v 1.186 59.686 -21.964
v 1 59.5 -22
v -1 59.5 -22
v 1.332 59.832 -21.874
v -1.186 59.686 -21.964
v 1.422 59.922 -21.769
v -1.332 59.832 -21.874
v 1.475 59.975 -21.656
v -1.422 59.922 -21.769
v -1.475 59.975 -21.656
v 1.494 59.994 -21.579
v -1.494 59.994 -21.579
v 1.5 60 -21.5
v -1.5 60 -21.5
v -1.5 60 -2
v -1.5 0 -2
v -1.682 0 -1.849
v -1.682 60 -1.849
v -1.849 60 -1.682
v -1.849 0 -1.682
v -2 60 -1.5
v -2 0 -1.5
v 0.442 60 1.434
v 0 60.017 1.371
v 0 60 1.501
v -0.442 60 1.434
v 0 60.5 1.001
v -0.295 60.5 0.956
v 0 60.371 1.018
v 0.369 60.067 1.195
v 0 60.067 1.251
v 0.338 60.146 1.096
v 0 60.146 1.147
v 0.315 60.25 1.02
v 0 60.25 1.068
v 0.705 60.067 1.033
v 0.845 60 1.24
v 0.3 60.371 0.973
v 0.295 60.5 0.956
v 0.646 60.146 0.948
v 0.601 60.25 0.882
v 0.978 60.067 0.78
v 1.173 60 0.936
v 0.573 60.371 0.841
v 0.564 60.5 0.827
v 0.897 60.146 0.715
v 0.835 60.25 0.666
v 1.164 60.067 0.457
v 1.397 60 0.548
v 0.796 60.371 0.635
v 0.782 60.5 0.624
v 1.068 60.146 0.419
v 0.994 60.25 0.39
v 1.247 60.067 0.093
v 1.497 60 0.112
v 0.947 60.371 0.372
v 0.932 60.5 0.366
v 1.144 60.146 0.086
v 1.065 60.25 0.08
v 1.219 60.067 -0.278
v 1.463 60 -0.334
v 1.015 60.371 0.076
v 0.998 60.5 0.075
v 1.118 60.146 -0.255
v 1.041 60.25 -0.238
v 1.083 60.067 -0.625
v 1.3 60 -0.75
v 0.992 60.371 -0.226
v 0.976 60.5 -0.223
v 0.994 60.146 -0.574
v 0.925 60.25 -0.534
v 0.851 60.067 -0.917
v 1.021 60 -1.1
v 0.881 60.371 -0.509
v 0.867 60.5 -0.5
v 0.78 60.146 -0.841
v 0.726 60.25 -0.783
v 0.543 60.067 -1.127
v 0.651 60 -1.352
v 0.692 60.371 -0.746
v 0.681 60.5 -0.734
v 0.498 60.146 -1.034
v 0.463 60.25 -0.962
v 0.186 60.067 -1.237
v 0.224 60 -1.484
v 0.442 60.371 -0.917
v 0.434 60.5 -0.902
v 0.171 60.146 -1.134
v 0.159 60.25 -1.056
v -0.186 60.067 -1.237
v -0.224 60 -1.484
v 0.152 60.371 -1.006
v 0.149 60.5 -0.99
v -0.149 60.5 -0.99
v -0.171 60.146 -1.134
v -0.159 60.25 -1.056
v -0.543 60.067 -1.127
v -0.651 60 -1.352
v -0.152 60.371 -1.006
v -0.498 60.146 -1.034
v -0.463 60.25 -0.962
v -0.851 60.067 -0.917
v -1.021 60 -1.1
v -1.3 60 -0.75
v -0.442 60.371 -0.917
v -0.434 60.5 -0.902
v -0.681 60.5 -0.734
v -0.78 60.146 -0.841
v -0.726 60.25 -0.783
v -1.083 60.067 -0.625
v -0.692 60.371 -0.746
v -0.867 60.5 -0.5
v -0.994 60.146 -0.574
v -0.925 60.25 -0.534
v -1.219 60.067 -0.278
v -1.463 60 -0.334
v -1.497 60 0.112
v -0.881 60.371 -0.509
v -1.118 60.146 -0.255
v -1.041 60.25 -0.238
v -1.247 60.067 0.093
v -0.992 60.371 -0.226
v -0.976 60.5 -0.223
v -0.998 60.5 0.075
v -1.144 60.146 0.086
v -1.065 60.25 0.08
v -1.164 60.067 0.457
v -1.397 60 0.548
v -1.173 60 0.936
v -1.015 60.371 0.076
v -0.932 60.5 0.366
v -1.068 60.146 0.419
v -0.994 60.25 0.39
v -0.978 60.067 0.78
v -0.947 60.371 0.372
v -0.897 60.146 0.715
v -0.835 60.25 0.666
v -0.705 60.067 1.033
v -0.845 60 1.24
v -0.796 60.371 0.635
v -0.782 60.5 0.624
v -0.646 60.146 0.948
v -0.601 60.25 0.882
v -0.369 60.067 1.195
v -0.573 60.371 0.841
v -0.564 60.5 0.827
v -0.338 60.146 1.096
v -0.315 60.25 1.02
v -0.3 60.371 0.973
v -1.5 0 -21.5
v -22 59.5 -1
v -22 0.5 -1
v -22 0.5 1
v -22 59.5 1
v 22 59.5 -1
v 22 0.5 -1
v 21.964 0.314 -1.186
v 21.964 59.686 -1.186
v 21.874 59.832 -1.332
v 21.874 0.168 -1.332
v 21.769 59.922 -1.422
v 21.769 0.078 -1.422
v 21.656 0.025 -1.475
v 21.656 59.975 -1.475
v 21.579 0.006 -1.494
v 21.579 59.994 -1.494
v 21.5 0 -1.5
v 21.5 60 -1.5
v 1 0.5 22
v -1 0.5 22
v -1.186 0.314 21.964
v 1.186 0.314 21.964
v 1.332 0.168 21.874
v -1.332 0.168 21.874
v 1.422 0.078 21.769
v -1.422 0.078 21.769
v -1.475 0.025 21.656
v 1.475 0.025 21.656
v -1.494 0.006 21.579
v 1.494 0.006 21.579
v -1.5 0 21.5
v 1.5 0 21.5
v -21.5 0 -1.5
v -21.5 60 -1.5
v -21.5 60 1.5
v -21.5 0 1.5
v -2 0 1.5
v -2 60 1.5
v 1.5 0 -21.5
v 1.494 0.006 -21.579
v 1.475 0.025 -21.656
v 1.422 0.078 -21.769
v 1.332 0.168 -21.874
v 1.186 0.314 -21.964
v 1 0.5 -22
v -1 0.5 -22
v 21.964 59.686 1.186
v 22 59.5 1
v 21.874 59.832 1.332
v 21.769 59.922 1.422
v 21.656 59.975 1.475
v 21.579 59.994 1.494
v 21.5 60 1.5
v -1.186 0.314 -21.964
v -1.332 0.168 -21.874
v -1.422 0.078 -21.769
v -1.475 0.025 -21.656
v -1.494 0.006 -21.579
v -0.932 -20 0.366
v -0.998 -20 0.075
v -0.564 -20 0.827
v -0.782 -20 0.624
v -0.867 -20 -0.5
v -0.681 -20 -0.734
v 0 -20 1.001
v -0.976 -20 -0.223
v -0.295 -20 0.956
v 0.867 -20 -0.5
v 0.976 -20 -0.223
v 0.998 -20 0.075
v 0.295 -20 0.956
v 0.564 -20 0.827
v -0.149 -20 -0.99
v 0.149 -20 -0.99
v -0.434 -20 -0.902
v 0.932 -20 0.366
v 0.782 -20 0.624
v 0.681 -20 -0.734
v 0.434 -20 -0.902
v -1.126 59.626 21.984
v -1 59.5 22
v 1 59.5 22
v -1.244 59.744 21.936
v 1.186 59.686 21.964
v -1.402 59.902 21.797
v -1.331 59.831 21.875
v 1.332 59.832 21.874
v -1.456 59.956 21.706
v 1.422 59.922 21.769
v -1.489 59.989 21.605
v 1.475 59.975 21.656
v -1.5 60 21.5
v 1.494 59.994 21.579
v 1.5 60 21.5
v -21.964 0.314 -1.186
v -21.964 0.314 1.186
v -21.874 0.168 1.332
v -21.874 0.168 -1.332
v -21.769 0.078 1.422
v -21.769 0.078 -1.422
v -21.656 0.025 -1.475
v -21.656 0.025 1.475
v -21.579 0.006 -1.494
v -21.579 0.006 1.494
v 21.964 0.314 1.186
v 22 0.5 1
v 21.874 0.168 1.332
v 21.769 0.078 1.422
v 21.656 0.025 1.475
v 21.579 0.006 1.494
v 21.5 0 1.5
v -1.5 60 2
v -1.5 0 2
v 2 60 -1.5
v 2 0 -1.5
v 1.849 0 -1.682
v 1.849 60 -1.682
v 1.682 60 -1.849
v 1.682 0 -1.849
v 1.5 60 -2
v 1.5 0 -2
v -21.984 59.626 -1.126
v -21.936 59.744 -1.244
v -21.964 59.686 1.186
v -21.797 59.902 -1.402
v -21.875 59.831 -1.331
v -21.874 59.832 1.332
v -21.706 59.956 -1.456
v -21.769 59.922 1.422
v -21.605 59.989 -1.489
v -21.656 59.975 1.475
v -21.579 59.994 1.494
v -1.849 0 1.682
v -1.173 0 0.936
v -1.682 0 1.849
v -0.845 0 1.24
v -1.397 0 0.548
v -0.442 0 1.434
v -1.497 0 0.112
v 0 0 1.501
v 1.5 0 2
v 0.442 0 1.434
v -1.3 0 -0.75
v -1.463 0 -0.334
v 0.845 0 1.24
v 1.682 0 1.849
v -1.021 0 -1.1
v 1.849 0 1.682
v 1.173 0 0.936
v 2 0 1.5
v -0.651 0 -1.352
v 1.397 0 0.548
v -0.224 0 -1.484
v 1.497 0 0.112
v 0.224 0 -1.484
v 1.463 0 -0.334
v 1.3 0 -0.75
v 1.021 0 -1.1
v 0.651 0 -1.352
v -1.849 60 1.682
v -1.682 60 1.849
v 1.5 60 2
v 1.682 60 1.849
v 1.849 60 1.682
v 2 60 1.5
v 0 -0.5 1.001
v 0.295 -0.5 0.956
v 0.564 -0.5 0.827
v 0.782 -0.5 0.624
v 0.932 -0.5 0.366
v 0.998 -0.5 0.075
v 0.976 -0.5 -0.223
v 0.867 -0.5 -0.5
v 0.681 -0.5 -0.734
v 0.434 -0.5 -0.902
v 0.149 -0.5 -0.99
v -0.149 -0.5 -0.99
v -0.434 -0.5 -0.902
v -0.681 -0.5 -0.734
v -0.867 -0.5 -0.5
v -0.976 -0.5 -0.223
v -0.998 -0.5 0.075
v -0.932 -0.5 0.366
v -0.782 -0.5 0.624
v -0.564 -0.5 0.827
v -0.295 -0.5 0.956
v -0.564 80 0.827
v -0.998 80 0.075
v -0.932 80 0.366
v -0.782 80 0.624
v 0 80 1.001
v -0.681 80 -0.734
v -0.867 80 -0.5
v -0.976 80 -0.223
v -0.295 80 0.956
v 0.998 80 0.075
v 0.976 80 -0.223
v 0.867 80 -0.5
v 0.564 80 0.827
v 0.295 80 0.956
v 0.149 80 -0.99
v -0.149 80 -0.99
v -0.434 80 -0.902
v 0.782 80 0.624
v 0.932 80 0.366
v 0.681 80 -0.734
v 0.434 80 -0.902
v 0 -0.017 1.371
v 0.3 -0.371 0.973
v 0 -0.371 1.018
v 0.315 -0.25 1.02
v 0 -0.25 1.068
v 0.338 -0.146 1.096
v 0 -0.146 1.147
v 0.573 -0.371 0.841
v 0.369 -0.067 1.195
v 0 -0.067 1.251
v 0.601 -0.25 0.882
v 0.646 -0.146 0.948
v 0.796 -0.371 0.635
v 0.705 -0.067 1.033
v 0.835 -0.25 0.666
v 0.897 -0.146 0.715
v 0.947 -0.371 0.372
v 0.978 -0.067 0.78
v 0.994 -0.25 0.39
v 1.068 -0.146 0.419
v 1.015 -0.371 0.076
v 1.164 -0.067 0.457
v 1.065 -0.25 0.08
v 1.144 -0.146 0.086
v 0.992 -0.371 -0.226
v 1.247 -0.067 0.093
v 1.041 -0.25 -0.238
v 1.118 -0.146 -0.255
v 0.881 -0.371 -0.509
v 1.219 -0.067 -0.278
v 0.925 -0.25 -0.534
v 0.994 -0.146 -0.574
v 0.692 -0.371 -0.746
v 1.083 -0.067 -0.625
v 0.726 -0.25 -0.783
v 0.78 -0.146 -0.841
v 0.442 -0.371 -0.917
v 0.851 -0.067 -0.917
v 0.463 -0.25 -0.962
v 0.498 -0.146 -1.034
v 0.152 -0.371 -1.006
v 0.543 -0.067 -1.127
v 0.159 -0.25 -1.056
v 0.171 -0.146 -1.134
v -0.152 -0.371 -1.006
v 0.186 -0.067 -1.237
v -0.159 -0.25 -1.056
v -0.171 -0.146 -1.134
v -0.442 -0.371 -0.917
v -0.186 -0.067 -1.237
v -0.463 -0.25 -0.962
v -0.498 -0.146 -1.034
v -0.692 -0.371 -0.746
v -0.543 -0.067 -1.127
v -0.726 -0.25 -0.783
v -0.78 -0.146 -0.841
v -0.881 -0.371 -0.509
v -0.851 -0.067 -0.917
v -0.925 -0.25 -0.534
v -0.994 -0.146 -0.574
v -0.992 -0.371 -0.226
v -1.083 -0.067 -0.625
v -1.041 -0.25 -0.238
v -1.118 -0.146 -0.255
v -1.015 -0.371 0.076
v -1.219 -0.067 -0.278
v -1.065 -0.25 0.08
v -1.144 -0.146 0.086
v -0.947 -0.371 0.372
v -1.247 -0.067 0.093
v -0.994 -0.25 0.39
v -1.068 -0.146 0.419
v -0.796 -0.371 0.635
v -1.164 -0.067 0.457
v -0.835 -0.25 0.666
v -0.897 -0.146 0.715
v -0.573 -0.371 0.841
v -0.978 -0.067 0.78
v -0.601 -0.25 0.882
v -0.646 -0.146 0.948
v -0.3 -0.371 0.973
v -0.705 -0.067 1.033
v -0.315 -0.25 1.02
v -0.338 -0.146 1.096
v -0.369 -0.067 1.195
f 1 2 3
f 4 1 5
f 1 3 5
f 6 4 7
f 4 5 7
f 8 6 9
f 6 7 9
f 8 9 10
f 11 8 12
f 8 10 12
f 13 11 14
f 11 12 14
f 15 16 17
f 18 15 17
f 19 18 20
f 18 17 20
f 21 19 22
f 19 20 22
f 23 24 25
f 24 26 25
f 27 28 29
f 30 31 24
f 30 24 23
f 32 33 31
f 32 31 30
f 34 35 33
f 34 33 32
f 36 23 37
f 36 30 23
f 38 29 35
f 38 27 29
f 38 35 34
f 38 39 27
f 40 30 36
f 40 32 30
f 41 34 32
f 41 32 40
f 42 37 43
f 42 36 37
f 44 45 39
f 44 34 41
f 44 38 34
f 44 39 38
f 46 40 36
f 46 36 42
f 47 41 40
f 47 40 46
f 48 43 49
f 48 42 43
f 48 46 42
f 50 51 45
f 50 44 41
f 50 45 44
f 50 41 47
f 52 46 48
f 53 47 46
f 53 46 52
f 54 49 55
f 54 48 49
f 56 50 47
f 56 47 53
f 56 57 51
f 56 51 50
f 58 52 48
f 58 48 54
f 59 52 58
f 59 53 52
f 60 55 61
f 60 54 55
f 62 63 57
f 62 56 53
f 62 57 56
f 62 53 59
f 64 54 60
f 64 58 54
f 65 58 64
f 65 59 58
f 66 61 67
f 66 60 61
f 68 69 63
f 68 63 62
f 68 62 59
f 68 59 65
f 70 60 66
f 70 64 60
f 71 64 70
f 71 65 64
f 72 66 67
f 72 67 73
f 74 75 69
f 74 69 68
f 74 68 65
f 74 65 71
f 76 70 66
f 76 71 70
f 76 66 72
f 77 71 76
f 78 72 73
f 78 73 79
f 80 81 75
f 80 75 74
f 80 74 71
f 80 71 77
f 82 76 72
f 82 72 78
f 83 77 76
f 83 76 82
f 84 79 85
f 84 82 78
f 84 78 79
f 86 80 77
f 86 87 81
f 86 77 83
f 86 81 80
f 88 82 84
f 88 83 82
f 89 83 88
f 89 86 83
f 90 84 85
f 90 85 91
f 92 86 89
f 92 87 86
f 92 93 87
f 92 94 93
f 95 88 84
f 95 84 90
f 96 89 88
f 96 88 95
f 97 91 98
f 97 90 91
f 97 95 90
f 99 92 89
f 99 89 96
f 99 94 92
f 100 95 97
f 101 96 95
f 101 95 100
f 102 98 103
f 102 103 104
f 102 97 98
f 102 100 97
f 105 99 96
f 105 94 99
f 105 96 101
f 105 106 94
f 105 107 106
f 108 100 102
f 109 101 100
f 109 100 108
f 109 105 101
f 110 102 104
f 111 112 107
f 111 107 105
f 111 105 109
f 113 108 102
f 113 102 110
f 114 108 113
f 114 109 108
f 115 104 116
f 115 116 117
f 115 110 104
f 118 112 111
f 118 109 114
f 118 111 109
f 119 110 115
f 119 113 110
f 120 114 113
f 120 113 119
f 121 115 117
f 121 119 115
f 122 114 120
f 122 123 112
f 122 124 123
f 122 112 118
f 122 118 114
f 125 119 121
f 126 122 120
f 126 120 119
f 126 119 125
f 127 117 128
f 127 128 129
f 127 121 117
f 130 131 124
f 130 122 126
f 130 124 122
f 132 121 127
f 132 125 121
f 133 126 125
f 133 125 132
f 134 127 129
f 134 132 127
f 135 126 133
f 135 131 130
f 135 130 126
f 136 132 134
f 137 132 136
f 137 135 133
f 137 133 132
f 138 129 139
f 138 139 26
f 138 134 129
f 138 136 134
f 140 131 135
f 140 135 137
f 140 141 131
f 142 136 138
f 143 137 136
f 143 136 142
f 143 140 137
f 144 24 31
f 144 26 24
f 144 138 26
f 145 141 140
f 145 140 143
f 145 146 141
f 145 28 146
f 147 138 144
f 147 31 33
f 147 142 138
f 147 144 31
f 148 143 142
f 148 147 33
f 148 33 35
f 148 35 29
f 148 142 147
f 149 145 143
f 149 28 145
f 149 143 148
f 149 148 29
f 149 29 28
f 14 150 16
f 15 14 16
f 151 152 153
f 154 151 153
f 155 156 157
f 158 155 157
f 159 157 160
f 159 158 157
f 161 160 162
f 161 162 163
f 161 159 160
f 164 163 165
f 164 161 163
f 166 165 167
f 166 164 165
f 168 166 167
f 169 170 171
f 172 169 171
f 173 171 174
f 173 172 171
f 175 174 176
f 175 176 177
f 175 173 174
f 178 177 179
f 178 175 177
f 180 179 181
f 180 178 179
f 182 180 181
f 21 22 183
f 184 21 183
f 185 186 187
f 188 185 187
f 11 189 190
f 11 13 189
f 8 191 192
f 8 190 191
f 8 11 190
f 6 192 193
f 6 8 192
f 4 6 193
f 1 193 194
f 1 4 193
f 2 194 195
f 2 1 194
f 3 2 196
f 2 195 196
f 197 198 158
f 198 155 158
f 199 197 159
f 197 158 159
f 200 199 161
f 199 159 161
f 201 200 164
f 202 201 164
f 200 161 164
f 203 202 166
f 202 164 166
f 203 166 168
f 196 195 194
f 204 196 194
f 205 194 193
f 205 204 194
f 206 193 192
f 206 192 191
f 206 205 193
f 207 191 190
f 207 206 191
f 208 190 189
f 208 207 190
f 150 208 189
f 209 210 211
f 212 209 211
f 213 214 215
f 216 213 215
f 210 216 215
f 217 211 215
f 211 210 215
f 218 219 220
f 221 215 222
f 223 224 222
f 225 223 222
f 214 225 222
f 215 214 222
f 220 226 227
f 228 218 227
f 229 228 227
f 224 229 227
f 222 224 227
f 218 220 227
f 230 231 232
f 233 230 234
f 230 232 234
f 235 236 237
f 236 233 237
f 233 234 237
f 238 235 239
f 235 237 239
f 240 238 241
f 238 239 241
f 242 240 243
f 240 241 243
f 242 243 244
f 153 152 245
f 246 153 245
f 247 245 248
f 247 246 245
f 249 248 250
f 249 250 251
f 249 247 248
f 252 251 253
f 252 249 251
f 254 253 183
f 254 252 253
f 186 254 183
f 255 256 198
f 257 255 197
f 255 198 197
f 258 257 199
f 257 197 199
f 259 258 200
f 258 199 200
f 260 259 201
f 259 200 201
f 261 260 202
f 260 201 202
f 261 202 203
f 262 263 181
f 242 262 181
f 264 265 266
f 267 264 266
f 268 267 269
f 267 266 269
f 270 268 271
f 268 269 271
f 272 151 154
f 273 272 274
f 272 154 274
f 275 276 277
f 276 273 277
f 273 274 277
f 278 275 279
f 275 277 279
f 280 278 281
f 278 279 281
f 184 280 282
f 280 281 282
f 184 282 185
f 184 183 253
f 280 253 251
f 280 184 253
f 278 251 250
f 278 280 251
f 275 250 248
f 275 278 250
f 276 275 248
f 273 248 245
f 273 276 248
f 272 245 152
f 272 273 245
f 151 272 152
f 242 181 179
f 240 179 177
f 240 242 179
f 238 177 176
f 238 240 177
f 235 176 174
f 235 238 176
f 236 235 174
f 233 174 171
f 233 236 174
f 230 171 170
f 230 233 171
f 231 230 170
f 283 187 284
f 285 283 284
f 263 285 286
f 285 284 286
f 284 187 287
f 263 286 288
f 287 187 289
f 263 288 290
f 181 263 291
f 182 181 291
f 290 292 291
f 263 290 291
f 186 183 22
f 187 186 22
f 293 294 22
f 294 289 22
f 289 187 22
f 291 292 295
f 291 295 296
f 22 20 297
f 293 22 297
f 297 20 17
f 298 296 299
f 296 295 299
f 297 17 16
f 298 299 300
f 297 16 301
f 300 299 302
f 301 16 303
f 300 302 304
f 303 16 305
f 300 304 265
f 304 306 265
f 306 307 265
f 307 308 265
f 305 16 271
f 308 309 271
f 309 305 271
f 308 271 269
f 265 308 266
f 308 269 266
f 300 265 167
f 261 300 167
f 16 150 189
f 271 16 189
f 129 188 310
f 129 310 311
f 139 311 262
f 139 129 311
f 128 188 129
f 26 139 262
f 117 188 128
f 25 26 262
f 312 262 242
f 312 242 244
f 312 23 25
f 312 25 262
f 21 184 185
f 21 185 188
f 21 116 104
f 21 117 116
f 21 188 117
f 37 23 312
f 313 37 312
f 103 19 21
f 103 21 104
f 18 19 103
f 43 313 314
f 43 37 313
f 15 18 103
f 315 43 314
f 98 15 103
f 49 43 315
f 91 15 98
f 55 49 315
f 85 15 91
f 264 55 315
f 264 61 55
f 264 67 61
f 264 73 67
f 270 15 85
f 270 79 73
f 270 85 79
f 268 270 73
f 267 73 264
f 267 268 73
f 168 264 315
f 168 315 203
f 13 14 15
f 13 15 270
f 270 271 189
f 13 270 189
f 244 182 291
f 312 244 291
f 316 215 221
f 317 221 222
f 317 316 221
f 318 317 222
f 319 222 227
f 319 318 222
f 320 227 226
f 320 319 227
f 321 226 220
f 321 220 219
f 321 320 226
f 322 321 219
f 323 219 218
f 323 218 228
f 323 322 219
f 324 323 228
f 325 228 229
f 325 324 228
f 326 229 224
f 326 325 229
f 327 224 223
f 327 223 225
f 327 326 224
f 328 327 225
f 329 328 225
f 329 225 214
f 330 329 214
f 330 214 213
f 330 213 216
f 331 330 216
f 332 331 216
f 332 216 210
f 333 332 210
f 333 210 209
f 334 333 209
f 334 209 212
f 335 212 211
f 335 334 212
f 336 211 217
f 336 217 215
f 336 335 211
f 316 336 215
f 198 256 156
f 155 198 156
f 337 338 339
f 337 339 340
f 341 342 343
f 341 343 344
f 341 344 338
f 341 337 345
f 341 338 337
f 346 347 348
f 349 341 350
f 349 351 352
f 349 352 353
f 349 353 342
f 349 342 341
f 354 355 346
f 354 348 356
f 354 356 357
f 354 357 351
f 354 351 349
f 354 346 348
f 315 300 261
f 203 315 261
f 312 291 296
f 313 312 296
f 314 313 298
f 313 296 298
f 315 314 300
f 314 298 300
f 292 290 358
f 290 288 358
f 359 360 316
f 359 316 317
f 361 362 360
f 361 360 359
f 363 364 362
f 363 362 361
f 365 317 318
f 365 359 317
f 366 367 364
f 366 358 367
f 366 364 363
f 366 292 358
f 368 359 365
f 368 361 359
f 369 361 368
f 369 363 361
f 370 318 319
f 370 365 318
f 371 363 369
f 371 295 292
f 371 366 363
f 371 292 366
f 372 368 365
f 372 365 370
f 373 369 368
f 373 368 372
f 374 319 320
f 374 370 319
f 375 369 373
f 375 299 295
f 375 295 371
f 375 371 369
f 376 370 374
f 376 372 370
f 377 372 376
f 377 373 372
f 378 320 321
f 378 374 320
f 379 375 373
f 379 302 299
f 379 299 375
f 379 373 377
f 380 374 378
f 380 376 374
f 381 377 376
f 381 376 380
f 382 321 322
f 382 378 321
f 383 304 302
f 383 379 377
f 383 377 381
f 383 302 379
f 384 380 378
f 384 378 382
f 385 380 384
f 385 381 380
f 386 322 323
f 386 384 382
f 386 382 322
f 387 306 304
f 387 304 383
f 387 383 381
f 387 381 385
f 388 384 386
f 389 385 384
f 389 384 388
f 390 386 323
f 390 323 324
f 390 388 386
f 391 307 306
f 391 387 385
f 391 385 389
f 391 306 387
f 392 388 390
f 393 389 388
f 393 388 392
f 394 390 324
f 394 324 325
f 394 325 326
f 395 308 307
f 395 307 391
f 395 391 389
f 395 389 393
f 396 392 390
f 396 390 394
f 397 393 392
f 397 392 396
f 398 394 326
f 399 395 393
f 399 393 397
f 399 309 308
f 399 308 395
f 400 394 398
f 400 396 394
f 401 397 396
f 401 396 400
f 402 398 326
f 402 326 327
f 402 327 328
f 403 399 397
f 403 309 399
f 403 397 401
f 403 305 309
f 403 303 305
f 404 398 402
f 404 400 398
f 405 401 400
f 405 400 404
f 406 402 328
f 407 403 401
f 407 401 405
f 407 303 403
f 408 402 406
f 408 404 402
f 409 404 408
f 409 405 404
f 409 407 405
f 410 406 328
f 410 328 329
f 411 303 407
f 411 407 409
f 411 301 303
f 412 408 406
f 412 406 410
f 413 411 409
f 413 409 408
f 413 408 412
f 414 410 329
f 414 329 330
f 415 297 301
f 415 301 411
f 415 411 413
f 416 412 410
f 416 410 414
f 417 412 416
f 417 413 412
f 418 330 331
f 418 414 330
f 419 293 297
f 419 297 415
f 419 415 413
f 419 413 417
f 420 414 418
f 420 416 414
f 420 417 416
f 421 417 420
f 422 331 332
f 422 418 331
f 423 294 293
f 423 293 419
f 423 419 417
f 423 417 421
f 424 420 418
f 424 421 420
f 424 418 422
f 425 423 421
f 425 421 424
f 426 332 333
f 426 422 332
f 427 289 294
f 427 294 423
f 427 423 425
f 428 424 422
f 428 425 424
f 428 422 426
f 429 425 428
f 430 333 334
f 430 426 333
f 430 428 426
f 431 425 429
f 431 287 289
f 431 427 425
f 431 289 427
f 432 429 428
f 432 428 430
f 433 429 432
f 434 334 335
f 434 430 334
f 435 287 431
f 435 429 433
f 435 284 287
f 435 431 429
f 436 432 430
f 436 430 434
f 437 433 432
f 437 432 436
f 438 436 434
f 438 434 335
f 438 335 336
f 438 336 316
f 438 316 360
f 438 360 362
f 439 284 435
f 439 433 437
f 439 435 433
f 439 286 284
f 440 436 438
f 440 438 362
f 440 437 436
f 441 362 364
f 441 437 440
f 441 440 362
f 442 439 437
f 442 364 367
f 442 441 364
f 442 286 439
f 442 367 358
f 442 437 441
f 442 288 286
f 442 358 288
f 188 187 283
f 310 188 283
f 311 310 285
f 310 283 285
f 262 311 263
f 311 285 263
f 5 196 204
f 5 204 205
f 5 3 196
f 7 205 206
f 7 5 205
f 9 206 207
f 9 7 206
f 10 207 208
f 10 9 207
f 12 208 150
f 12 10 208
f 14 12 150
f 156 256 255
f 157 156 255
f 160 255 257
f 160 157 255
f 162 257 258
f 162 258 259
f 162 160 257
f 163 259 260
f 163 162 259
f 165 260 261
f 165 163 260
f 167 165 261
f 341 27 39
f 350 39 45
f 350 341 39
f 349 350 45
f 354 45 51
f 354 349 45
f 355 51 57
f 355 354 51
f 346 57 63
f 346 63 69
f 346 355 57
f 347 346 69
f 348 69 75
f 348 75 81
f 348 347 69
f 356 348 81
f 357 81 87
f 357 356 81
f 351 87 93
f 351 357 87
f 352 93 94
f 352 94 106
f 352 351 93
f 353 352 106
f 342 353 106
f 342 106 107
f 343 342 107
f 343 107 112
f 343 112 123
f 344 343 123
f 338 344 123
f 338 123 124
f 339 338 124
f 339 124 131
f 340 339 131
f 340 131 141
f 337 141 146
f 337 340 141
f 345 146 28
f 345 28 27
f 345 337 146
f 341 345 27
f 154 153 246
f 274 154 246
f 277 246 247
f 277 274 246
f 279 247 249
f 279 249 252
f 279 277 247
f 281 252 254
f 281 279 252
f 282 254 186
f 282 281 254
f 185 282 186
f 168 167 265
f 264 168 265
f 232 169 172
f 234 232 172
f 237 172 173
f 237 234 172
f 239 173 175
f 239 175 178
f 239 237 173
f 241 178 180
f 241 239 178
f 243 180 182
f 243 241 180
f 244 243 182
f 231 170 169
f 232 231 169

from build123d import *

# Parameters (mm, degrees)
BOSS_EXTRUDE1_DEPTH = 60
FILLET1_R           = 0.5
SKETCH3_R           = 1.000778627
CUT_EXTRUDE1_DEPTH  = 60
SKETCH4_R           = 1.000778627
BOSS_EXTRUDE2_DEPTH = 50
FILLET2_R           = 0.5


with BuildPart() as part:
    # Sketch2 → Boss-Extrude1 (new body)
    with BuildSketch(Plane(origin=(0, 0, 0), x_dir=(1, 0, 0), z_dir=(0, 1, 0))):
        with BuildLine():
            Line((22, -1.5), (22, 1.5))
            Line((22, 1.5), (2, 1.5))
            ThreePointArc((2, 1.5), (1.767766953, 1.767766953), (1.5, 2))
            Line((1.5, 2), (1.5, 22))
            Line((1.5, 22), (-1.5, 22))
            Line((-1.5, 22), (-1.5, 2))
            ThreePointArc((-1.5, 2), (-1.767766953, 1.767766953), (-2, 1.5))
            Line((-2, 1.5), (-22, 1.5))
            Line((-22, 1.5), (-22, -1.5))
            Line((-22, -1.5), (-2, -1.5))
            ThreePointArc((-2, -1.5), (-1.767766953, -1.767766953), (-1.5, -2))
            Line((-1.5, -2), (-1.5, -22))
            Line((-1.5, -22), (1.5, -22))
            Line((1.5, -22), (1.5, -2))
            ThreePointArc((1.5, -2), (1.767766953, -1.767766953), (2, -1.5))
            Line((2, -1.5), (22, -1.5))
        make_face()
    extrude(amount=BOSS_EXTRUDE1_DEPTH)

    # Fillet1
    fillet1_edges = [part.edges().sort_by_distance(p)[0] for p in [
        (22, 0, 0),
        (0, 0, 22),
        (0, 60, -22),
        (-22, 0, 0),
        (0, 0, -22),
        (22, 30, -1.5),
        (22, 30, 1.5),
        (1.5, 30, 22),
        (-1.5, 30, 22),
        (-22, 30, 1.5),
        (-22, 30, -1.5),
        (-1.5, 30, -22),
        (1.5, 30, -22),
        (-22, 60, 0),
        (0, 60, 22),
        (22, 60, 0),
    ]]
    fillet(fillet1_edges, radius=FILLET1_R)

    # Sketch3 → Cut-Extrude1 (cut)
    with BuildSketch(Plane(origin=(0, 0, 0), x_dir=(1, 0, 0), z_dir=(0, 1, 0))):
        with Locations(Location((0, 0, 0), (0, 0, 270))):
            Circle(SKETCH3_R)
    extrude(amount=CUT_EXTRUDE1_DEPTH, mode=Mode.SUBTRACT)

    # Sketch4 → Boss-Extrude2 (add, symmetric)
    with BuildSketch(Plane(origin=(0, 30, 0), x_dir=(1, 0, 0), z_dir=(0, 1, 0))):
        with Locations(Location((0, 0, 0), (0, 0, 270))):
            Circle(SKETCH4_R)
    extrude(amount=BOSS_EXTRUDE2_DEPTH, both=True)

    # Fillet2
    fillet2_edges = [part.edges().sort_by_distance(p)[0] for p in [
        (0, 60, -1.000778627),
        (0, 0, -1.000778627),
    ]]
    fillet(fillet2_edges, radius=FILLET2_R)


solid = part.part
